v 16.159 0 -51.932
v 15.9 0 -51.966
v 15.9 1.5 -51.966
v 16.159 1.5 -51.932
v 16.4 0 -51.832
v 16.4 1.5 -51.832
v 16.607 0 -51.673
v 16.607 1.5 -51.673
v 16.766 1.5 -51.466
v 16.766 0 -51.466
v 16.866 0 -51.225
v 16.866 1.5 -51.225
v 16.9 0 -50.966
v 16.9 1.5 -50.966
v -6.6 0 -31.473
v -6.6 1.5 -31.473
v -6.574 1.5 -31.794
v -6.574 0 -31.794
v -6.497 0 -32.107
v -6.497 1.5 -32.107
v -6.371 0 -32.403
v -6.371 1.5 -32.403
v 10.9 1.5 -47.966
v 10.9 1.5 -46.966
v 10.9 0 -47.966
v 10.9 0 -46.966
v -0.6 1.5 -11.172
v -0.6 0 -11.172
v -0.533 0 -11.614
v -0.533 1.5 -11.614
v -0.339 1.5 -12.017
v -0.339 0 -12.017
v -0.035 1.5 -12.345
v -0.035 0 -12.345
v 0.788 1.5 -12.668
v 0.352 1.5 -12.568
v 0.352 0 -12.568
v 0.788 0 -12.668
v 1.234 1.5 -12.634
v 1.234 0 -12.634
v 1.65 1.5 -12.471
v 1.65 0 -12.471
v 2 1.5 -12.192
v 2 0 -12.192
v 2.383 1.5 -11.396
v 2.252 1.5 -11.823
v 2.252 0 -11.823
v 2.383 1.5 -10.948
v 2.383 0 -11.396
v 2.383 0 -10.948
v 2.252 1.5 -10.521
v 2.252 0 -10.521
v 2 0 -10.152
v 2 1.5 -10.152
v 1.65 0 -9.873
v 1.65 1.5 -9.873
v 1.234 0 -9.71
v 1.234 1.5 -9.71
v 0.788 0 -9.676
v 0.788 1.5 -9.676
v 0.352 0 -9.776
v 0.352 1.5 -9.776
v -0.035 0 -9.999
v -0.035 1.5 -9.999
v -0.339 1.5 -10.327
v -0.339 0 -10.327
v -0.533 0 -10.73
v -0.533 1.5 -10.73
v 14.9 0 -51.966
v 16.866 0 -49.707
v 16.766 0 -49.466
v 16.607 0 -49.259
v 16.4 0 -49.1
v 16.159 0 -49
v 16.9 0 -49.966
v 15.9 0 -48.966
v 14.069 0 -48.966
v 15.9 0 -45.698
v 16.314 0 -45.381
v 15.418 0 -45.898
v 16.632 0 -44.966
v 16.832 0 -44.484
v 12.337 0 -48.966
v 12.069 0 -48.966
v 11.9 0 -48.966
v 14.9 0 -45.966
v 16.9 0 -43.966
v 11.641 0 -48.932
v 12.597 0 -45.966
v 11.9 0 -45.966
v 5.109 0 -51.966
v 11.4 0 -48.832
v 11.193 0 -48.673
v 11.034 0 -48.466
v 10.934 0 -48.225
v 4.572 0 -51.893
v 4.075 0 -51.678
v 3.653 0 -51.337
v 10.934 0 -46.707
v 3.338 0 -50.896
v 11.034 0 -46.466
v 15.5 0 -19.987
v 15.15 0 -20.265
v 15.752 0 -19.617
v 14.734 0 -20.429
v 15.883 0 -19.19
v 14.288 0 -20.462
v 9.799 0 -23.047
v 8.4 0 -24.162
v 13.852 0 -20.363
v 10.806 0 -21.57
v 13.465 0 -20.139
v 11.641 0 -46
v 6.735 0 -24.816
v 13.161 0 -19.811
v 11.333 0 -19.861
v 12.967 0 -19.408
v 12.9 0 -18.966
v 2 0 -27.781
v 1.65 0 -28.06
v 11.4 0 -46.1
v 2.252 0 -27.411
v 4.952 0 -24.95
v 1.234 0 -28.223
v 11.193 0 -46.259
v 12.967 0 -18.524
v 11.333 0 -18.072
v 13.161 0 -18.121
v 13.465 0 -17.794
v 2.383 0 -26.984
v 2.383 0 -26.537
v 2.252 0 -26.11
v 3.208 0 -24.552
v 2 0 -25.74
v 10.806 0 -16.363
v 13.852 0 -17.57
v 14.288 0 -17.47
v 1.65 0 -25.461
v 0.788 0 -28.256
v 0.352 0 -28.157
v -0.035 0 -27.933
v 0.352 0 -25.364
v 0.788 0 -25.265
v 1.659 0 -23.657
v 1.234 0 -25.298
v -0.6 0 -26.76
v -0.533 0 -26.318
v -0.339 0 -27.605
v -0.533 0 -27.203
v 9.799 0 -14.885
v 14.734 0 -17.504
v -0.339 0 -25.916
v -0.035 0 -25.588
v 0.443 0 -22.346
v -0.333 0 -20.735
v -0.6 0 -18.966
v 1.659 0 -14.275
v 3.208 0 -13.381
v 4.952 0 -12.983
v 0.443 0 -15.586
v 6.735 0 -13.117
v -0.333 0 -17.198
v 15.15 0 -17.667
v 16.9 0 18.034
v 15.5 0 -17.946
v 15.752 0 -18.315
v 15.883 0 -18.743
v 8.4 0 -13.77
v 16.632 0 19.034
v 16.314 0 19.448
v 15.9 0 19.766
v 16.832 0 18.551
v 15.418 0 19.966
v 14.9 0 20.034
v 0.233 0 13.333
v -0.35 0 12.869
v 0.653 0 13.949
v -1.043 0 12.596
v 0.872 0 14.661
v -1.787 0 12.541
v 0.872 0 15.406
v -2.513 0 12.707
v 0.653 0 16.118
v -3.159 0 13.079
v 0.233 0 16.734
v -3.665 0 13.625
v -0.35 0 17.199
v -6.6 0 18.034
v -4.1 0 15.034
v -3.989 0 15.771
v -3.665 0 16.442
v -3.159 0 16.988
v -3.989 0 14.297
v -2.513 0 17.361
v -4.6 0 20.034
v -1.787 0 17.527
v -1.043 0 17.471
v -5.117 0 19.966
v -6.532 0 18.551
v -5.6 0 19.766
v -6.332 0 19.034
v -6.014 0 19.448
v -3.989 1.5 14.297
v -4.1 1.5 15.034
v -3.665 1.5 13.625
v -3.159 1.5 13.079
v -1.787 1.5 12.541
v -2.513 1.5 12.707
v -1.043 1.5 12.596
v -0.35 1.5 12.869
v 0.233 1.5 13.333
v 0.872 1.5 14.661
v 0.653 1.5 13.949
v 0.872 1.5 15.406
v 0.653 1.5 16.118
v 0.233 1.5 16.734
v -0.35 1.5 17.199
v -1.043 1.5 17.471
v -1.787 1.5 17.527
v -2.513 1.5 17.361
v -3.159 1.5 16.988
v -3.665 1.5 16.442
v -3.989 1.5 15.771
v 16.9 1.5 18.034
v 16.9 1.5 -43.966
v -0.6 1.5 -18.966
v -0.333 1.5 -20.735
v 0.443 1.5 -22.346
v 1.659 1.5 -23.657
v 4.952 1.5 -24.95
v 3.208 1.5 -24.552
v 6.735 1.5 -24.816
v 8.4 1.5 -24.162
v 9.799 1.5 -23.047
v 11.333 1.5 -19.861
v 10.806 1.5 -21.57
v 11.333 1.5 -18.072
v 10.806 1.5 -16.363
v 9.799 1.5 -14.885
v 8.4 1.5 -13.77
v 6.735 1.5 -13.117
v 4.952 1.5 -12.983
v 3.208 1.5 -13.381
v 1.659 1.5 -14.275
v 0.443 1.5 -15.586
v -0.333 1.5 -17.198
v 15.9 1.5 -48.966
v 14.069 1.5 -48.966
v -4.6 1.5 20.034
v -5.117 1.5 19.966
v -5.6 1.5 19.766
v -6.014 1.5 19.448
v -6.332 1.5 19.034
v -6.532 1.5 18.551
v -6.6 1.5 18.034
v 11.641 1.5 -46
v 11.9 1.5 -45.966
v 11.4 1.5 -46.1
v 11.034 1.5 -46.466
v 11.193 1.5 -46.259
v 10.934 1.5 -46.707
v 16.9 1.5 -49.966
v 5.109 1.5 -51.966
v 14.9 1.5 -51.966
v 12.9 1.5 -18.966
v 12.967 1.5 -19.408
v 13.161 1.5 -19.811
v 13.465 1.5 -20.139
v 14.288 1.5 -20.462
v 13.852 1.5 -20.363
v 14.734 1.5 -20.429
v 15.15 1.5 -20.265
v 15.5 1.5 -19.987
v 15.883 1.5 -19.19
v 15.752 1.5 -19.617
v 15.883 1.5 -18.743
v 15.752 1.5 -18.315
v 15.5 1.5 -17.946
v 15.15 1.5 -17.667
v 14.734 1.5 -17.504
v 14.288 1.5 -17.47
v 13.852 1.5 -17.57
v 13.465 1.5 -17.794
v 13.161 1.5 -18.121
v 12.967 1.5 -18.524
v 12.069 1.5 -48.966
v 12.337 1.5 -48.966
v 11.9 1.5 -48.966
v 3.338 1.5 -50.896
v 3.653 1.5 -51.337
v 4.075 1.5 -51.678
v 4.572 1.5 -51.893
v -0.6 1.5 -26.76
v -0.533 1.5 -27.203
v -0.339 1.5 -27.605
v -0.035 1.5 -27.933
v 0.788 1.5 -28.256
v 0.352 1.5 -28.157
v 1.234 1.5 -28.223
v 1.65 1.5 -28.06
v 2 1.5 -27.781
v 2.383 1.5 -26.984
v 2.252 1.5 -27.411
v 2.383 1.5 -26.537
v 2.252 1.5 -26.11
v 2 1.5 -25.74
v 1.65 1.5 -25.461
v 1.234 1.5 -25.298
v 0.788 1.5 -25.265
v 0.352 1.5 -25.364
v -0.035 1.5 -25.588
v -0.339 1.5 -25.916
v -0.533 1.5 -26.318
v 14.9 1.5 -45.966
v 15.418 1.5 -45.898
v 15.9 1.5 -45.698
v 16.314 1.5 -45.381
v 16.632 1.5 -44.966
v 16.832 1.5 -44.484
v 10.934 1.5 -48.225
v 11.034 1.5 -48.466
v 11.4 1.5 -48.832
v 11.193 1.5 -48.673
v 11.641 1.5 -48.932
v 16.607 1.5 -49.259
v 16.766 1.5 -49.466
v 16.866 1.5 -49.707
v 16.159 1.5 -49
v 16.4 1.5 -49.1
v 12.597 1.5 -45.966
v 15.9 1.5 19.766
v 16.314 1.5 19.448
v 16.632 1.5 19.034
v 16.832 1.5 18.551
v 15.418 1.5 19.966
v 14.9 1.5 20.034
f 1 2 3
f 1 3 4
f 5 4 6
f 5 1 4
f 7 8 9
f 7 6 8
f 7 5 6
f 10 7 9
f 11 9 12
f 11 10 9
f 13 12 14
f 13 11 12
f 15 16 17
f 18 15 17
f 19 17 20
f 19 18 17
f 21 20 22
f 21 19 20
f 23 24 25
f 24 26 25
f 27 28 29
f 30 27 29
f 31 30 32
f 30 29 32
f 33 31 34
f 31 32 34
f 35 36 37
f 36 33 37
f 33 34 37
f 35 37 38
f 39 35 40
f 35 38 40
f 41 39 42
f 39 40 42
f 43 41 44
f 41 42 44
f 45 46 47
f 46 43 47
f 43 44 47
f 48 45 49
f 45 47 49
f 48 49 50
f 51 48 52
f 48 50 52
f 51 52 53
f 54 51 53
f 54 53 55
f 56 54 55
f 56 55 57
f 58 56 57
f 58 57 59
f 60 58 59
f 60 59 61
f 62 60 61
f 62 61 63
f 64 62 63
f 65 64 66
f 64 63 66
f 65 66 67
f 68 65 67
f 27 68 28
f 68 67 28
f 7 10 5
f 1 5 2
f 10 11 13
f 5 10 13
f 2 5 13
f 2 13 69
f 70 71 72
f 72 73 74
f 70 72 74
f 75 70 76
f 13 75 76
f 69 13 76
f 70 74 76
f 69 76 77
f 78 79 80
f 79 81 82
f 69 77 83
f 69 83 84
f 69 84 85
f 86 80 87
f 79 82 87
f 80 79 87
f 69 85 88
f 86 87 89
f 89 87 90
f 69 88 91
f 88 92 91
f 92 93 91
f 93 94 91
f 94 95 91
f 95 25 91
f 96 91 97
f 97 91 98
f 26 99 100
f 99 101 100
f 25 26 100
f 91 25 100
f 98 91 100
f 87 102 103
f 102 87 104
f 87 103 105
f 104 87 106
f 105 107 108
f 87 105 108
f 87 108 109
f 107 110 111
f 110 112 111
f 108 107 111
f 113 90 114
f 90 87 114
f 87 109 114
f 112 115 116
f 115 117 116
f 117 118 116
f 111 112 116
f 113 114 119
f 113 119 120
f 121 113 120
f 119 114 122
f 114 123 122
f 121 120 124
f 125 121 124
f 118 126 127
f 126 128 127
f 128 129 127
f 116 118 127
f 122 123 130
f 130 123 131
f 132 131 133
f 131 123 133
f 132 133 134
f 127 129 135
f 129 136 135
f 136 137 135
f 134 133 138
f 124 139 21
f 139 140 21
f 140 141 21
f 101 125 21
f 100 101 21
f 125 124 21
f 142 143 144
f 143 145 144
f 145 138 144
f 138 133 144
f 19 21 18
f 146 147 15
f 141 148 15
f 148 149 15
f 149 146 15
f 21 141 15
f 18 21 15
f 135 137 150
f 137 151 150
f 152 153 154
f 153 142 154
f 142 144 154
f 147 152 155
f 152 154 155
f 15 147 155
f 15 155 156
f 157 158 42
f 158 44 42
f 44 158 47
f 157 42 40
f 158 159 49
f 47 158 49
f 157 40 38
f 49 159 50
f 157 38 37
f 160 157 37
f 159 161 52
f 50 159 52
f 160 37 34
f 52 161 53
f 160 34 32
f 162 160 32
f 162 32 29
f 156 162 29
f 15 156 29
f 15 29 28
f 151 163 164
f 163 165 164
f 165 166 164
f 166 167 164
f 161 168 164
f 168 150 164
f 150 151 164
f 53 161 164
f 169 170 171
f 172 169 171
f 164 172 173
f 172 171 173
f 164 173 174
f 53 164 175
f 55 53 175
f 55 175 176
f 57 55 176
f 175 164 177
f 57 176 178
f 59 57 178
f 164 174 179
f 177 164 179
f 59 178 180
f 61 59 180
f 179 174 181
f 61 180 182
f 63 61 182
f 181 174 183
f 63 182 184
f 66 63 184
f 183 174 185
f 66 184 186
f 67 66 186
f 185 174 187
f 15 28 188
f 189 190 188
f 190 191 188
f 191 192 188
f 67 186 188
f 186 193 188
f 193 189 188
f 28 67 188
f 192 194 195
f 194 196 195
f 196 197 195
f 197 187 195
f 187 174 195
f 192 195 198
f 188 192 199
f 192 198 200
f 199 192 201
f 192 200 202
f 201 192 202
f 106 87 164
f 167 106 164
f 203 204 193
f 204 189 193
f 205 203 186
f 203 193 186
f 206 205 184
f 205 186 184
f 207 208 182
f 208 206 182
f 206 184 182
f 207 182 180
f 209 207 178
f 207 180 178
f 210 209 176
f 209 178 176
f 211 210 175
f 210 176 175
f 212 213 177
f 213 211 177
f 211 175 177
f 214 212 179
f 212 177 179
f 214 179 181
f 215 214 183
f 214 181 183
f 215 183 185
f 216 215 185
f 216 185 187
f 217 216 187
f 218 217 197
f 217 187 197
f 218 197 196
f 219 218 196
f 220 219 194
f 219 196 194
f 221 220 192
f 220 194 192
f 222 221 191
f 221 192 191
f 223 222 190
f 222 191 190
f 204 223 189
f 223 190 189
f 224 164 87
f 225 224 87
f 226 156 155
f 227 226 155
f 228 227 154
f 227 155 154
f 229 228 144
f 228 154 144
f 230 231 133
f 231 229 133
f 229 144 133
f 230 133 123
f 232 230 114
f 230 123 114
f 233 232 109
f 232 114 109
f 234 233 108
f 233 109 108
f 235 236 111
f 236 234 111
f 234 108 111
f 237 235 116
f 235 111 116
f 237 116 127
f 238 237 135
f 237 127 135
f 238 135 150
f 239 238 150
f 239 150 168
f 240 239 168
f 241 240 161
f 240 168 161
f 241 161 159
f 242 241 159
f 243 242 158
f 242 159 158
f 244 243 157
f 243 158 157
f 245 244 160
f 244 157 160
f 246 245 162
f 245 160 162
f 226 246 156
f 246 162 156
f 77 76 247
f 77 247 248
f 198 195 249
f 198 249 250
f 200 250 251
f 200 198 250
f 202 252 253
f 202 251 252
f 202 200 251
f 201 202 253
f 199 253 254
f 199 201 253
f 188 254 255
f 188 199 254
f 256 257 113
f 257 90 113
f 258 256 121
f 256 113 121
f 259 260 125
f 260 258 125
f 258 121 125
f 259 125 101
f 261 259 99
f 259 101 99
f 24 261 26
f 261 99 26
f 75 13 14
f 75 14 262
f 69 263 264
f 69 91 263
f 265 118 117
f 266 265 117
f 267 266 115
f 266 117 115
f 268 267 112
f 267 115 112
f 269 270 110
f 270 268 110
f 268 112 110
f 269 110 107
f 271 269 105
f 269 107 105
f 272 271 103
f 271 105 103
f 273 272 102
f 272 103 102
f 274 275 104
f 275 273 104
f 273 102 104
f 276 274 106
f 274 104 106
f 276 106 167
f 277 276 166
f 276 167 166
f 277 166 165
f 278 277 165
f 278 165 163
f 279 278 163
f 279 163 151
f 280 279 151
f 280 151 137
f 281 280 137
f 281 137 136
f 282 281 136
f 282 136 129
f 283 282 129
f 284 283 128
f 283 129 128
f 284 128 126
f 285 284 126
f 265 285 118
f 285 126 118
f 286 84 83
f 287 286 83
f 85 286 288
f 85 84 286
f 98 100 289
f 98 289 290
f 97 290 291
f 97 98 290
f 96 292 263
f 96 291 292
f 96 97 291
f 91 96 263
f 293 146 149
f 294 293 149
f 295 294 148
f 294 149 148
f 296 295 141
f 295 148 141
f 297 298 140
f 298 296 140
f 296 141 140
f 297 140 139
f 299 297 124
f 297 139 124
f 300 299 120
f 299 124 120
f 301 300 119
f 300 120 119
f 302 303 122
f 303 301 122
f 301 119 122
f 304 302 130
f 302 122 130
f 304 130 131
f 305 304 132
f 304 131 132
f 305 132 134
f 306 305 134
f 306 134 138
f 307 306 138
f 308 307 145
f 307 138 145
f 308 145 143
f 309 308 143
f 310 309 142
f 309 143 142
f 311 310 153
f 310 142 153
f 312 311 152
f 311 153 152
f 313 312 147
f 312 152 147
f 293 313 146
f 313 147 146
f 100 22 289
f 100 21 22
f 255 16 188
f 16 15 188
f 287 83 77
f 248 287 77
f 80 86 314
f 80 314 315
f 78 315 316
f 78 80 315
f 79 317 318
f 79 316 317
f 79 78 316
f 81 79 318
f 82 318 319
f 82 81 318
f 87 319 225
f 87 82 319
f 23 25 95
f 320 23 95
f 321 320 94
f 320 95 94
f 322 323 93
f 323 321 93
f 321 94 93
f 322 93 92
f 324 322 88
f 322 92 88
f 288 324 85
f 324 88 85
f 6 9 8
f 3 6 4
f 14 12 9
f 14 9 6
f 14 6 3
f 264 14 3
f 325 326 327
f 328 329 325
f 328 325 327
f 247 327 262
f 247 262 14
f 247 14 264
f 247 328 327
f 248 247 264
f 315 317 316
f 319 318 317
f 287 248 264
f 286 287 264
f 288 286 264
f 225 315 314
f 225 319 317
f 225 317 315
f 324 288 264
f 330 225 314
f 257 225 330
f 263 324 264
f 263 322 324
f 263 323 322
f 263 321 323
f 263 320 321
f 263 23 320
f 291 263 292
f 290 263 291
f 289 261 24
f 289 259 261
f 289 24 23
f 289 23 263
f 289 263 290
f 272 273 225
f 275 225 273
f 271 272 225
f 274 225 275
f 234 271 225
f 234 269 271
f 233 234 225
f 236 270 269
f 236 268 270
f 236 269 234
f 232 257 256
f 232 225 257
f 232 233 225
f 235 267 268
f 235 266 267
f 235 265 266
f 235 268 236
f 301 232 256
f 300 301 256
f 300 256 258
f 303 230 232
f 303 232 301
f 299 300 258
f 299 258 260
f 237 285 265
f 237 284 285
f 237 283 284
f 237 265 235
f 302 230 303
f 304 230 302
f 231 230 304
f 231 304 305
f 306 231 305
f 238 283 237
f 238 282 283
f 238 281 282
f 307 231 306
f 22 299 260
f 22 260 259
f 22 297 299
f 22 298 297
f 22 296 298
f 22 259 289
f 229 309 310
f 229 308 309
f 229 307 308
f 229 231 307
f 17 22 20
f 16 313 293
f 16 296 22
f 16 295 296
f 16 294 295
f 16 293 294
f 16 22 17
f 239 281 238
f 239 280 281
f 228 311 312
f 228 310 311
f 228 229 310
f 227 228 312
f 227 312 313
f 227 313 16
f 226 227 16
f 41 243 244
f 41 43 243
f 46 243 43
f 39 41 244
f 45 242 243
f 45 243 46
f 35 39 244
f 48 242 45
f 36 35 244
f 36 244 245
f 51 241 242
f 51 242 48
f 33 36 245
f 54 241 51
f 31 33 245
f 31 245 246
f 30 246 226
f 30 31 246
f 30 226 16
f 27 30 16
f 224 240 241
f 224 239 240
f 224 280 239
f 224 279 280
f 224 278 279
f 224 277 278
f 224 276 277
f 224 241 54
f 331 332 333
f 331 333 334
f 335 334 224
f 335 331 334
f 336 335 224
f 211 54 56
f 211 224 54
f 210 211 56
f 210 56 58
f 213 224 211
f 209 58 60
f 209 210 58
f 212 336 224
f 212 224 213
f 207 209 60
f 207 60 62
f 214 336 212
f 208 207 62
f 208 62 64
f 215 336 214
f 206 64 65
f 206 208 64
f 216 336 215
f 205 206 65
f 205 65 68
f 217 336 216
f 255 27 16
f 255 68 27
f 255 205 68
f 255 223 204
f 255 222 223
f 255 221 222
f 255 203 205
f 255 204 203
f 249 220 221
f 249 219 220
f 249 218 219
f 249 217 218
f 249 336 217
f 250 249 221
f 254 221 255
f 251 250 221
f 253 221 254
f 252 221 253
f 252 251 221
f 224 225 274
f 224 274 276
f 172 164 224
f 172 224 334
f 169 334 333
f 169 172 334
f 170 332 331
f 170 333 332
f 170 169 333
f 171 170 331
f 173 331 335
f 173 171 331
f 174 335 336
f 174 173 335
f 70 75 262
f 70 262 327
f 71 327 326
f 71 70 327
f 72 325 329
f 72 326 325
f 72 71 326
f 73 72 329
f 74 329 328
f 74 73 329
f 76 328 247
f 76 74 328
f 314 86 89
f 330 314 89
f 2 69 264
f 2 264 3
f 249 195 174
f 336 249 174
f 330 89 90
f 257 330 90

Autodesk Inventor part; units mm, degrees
ref_plane "YZ Plane" through (0, 0, 0) normal (1, 0, 0) x (0, 1, 0)
ref_plane "XZ Plane" through (0, 0, 0) normal (0, 1, 0) x (-1, 0, 0)
ref_plane "XY Plane" through (0, 0, 0) normal (0, 0, 1) x (1, 0, 0)
sketch "Sketch1" plane through (0, 0, 0) normal (0, 1, 0) x (-1, 0, 0)
  line L0 (4.5998, 20.0337) -> (-14.9002, 20.0337)
  line L1 (6.3706, -32.4029) -> (-3.3383, -50.8959)
  line L2 (6.5998, -31.4732) -> (6.5998, 18.0337)
  line L3 (-5.1091, -51.9663) -> (-14.9002, -51.9663)
  circle A0 centre (1.5998, 15.0337) radius 2.5
  circle A1 centre (-5.4002, -18.9663) radius 6
  line L4 (-14.9002, -45.9663) -> (-12.597, -45.9663)
  line L5 (-12.0688, -48.9663) -> (-14.0688, -48.9663)
  line L6 (-16.9002, 18.0337) -> (-16.9002, -43.9663)
  arc A2 (-16.9002, -43.9663) -> (-14.9002, -45.9663) centre (-14.9002, -43.9663) ccw
  arc A3 (-5.1091, -51.9663) -> (-3.3383, -50.8959) centre (-5.1091, -49.9663) ccw
  arc A4 (6.3706, -32.4029) -> (6.5998, -31.4732) centre (4.5998, -31.4732) ccw
  arc A5 (6.5998, 18.0337) -> (4.5998, 20.0337) centre (4.5998, 18.0337) ccw
  arc A6 (-14.9002, 20.0337) -> (-16.9002, 18.0337) centre (-14.9002, 18.0337) ccw
  circle A7 centre (-14.4002, -18.9663) radius 1.5
  circle A8 centre (-0.9002, -11.172) radius 1.5
  circle A9 centre (-0.9002, -26.7605) radius 1.5
  line L7 (-12.597, -45.9663) -> (-11.9002, -45.9663)
  line L8 (-10.9002, -46.9663) -> (-10.9002, -47.9663)
  line L9 (-12.3368, -48.9663) -> (-11.9002, -48.9663)
  line L10 (-14.9002, -51.9663) -> (-15.9002, -51.9663)
  line L11 (-16.9002, -50.9663) -> (-16.9002, -49.9663)
  line L12 (-15.9002, -48.9663) -> (-14.0688, -48.9663)
  arc A10 (-10.9002, -46.9663) -> (-11.9002, -45.9663) centre (-11.9002, -46.9663) ccw
  arc A11 (-11.9002, -48.9663) -> (-10.9002, -47.9663) centre (-11.9002, -47.9663) ccw
  arc A12 (-15.9002, -48.9663) -> (-16.9002, -49.9663) centre (-15.9002, -49.9663) ccw
  arc A13 (-16.9002, -50.9663) -> (-15.9002, -51.9663) centre (-15.9002, -50.9663) ccw
  point P0 (0, 0)
  point P1 (6.5998, 20.0337)
  point P2 (-16.9002, 20.0337)
  point P3 (6.5998, -31.9663)
  point P4 (-3.9002, -51.9663)
  point P5 (-16.9002, -45.9663)
  point P6 (-10.9002, -45.9663)
  point P7 (-10.9002, -48.9663)
  point P8 (-16.9002, -51.9663)
  point P9 (-16.9002, -48.9663)
  dimension "d1" = 23.5
  dimension "d3" = 52
  dimension "d5" = 5
  dimension "d6" = 5
  dimension "d7" = 5
  dimension "d8" = 12
  dimension "d9" = 12
  dimension "d10" = 39
  dimension "d28" = 3
  dimension "d29" = 9
  dimension "d30" = 2.5
  dimension "d31" = 3
  dimension "d32" = 3
  dimension "d33" = 120
  dimension "d34" = 120
  dimension "d35" = 9
  dimension "d36" = 9
  dimension "d37" = 3
  dimension "d38" = 6
  dimension "d39" = 3
  dimension "d40" = 6
  dimension "d41" = 1
  dimension "d44" = 13
extrude "Extrusion1" add sketch "Sketch1" along normal blind 1.5
properties part number "bras_amortisseur"
